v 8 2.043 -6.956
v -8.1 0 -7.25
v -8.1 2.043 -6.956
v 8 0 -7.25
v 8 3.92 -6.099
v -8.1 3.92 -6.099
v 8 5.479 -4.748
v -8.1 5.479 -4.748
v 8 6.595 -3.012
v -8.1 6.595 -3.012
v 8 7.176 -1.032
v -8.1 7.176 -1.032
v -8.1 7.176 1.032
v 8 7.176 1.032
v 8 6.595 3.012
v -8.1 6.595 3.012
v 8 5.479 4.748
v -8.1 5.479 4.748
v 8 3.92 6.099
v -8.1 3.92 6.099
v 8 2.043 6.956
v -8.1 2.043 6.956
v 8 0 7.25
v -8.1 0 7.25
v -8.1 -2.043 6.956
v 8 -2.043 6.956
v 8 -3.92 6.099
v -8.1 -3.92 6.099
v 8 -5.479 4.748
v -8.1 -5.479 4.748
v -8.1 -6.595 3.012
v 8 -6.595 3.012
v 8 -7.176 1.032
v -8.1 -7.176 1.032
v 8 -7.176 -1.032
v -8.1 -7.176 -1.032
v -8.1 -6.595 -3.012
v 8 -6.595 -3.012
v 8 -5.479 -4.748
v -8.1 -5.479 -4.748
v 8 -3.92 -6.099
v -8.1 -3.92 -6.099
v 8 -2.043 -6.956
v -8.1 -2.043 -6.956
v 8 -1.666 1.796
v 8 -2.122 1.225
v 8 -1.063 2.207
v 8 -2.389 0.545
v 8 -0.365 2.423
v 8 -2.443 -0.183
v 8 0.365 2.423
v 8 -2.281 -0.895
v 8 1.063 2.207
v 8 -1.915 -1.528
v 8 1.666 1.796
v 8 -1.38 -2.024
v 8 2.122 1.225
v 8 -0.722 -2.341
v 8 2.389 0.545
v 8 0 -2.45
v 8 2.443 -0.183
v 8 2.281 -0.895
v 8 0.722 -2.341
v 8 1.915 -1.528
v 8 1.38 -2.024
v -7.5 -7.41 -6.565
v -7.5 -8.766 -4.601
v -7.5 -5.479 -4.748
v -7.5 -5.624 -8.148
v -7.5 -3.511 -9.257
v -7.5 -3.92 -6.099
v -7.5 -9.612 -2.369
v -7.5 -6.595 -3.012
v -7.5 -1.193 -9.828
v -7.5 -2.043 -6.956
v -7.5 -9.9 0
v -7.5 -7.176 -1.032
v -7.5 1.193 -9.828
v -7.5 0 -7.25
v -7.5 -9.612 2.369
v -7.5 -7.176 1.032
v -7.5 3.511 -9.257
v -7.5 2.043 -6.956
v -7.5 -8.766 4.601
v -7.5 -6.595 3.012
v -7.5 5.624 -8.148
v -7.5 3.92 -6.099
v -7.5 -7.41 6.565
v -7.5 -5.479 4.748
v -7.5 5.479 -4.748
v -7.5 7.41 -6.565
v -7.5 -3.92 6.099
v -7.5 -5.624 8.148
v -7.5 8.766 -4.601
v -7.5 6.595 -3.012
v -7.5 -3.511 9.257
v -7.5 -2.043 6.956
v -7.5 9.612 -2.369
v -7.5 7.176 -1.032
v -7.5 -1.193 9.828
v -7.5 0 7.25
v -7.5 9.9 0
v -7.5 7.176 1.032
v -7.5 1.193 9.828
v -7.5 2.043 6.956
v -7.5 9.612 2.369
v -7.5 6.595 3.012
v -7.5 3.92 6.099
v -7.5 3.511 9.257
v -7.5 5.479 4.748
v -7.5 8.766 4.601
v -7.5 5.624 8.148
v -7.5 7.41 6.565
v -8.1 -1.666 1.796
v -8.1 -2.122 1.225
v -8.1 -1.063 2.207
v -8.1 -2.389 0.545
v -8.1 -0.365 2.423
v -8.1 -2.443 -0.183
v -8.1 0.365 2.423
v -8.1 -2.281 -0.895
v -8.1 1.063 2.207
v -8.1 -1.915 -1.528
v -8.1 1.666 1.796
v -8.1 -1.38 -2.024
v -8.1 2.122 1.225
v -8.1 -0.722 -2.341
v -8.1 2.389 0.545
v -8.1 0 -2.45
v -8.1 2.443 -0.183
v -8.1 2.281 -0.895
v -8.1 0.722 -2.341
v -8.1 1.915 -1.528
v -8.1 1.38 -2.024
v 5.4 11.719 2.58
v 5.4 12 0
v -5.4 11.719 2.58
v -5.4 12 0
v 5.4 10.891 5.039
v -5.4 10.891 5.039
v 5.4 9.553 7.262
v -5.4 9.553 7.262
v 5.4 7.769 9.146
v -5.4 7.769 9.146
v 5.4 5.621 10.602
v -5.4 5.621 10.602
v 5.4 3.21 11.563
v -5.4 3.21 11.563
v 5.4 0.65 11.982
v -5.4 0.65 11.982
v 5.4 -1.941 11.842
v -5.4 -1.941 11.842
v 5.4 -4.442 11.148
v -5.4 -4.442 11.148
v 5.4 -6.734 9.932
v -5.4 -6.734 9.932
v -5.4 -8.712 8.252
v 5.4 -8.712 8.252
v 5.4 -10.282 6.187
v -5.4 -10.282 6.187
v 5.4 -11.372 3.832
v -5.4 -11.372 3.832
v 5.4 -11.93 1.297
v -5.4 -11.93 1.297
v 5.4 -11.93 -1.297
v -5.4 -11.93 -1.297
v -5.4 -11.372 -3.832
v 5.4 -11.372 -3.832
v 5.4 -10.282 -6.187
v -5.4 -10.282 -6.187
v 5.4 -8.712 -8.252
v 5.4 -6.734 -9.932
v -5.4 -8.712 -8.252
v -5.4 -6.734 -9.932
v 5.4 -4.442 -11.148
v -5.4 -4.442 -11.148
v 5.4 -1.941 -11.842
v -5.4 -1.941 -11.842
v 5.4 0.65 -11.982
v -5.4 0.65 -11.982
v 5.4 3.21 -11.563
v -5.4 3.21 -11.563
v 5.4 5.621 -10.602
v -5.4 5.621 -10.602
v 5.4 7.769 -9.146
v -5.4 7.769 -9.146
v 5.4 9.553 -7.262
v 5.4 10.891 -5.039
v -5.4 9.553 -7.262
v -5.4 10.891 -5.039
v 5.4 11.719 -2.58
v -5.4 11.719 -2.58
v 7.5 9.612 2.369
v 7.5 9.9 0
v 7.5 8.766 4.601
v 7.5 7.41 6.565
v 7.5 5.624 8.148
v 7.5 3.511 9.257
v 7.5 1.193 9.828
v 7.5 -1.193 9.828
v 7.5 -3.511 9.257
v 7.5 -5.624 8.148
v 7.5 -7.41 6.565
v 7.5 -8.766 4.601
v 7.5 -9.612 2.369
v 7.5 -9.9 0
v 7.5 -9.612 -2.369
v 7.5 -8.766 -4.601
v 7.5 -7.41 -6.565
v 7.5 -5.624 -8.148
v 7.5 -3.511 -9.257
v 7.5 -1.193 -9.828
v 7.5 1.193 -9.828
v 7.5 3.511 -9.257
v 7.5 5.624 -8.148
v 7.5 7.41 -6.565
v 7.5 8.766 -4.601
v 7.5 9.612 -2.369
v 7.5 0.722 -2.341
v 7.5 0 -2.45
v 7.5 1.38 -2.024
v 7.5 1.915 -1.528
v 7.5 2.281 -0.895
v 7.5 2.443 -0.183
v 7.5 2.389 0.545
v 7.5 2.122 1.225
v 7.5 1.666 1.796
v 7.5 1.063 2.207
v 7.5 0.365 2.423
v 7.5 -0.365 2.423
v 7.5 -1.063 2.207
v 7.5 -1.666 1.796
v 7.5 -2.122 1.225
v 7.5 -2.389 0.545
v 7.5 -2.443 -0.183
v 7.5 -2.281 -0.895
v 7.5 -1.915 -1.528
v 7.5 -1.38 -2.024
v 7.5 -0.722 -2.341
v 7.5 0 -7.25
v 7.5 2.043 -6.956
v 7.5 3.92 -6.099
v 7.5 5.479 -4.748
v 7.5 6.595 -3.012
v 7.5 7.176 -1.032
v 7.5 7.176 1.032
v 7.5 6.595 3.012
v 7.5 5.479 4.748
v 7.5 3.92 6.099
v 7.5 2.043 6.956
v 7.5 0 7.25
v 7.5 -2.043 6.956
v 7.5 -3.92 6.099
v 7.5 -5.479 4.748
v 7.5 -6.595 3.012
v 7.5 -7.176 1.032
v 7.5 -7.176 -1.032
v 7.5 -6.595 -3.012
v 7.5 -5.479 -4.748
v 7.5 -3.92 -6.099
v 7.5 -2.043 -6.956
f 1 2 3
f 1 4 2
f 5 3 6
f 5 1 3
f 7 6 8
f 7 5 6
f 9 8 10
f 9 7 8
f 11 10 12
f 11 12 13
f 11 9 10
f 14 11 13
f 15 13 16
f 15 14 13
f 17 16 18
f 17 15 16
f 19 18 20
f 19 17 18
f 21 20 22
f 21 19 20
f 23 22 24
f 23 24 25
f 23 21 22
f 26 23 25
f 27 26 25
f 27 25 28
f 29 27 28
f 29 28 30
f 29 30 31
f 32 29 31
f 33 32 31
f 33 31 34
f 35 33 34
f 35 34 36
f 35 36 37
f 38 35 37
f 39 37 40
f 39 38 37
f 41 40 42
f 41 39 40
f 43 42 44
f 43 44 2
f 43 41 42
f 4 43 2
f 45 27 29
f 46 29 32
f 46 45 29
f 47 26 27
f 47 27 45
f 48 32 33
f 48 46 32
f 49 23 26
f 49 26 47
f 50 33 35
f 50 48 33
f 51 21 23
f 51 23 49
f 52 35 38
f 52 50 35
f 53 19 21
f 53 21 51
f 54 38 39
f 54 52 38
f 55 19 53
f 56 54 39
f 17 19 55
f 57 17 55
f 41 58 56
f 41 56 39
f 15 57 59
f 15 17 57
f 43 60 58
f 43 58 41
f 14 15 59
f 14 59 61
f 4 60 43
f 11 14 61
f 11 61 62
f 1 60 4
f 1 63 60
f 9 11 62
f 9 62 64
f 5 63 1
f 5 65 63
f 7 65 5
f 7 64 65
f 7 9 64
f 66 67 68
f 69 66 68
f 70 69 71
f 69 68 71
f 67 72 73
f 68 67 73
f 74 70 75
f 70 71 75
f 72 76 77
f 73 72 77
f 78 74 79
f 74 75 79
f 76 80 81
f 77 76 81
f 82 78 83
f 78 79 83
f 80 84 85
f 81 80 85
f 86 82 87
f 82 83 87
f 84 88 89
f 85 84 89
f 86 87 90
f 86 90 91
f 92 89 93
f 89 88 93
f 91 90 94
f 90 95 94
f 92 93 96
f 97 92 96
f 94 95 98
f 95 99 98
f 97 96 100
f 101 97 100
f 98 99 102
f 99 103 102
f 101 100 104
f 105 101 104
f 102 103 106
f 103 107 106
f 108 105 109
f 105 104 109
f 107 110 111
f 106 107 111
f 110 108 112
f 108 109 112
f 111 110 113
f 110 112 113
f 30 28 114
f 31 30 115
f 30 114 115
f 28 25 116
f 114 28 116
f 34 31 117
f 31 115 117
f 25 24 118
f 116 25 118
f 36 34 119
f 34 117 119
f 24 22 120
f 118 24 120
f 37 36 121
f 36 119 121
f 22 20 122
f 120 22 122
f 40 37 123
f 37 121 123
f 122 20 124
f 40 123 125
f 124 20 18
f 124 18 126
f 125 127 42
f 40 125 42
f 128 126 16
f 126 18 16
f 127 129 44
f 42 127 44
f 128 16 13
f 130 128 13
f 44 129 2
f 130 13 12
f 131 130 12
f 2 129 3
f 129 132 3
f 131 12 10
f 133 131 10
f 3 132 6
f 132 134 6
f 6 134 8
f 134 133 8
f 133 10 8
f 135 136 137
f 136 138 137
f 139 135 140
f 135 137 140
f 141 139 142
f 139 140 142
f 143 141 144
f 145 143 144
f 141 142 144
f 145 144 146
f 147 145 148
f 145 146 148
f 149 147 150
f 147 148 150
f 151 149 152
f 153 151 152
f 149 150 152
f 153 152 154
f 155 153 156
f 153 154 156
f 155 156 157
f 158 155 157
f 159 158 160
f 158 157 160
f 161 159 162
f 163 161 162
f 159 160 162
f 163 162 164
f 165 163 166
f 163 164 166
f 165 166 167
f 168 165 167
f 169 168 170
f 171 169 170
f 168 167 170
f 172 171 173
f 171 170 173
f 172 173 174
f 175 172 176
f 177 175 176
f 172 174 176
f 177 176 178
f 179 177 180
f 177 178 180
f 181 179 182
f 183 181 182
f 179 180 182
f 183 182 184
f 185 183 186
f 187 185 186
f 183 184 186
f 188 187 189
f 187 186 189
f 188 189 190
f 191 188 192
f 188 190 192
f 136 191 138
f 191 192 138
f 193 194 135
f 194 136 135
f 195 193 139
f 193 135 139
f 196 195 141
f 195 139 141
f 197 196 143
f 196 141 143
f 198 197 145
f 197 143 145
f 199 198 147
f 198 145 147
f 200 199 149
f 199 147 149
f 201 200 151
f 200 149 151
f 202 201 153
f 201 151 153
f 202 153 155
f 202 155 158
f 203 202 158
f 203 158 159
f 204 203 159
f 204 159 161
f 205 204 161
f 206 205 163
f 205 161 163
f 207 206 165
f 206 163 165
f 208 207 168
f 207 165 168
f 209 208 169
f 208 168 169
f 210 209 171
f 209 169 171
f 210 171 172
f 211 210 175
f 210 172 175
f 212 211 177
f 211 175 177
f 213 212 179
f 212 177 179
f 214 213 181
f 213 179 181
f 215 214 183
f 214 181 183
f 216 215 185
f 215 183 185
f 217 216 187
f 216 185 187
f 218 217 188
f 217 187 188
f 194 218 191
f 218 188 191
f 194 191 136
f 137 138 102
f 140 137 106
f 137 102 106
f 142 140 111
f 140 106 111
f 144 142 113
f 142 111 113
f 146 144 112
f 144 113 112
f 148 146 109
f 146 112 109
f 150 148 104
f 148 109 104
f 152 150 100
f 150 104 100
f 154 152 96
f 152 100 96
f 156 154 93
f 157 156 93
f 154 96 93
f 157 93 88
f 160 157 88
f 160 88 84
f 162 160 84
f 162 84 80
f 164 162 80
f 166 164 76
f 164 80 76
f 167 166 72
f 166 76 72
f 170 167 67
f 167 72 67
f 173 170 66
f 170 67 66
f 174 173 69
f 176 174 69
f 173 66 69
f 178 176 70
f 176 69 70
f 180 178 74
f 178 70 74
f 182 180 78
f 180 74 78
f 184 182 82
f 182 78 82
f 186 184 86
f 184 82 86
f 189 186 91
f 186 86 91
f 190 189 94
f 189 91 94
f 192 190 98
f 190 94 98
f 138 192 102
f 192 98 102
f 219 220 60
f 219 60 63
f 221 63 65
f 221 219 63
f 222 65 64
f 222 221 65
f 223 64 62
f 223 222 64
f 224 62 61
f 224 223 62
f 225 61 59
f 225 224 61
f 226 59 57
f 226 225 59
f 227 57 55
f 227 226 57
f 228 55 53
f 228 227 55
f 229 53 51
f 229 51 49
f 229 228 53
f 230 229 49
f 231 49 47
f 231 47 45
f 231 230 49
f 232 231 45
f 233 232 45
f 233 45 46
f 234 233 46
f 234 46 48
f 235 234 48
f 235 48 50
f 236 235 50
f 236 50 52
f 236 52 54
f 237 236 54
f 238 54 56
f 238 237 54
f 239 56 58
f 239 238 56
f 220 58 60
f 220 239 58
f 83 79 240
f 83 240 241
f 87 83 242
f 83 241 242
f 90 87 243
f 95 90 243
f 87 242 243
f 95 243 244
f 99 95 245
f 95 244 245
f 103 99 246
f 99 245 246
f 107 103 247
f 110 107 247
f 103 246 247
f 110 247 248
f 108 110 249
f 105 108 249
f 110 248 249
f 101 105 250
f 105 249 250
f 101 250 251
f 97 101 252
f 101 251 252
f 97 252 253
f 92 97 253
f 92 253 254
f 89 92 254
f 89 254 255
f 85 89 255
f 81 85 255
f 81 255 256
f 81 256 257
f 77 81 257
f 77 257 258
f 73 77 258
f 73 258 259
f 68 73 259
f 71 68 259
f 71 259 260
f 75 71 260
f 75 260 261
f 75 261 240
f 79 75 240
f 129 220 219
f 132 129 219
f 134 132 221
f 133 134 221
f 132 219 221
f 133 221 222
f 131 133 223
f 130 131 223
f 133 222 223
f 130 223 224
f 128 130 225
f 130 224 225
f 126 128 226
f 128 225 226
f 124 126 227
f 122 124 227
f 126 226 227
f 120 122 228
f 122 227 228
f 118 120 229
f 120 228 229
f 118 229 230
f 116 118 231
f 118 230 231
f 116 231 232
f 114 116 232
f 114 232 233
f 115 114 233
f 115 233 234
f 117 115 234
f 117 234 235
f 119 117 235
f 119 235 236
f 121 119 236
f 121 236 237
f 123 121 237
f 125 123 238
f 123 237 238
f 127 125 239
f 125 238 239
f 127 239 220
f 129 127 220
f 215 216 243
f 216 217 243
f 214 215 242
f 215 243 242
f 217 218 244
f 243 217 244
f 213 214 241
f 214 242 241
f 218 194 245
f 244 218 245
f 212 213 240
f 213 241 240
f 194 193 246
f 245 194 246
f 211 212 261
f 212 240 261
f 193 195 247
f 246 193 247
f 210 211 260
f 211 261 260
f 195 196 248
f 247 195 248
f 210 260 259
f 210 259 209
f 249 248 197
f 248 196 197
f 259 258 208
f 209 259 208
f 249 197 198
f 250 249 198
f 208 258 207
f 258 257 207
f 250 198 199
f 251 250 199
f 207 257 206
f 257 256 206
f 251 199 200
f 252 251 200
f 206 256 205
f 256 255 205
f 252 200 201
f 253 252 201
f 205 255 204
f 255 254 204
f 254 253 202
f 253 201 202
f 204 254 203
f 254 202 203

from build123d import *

# Parameters (mm, degrees)
CROQUIS2_R                   = 7.25
CROQUIS2_R_2                 = 2.45
SALIENTE_EXTRUIR1_DEPTH      = 0.5
SALIENTE_EXTRUIR1_DEPTH_BACK = 15.6
CROQUIS3_R                   = 7.25
CORTAR_EXTRUIR1_DEPTH        = 14
CORTAR_EXTRUIR1_DEPTH_BACK   = 17.5


with BuildPart() as part:
    # Croquis1 → Revolución1 (revolve)
    with BuildSketch(Plane.XY):
        Polygon((5.4, 12), (-5.4, 12), (-7.5, 9.9), (-7.5, 2.45), (-3, 2.45), (3, 2.45), (7.5, 2.45), (7.5, 9.9), align=None)
    revolve(axis=Axis((0, 0, 0), (1, 0, 0)))

    # Croquis3 → Cortar-Extruir1 (cut, two sides)
    with BuildSketch(Plane(origin=(7.5, 0, 0), x_dir=(0, 0, -1), z_dir=(1, 0, 0))) as cortar_extruir1_sk:
        Circle(CROQUIS3_R)
    extrude(amount=CORTAR_EXTRUIR1_DEPTH, mode=Mode.SUBTRACT)
    extrude(cortar_extruir1_sk.sketch, amount=-CORTAR_EXTRUIR1_DEPTH_BACK, mode=Mode.SUBTRACT)


with BuildPart() as body_2:
    # Croquis2 → Saliente-Extruir1 (new body, two sides)
    with BuildSketch(Plane(origin=(7.5, 0, 0), x_dir=(0, 0, -1), z_dir=(1, 0, 0))) as saliente_extruir1_sk:
        Circle(CROQUIS2_R)
        Circle(CROQUIS2_R_2, mode=Mode.SUBTRACT)
    extrude(amount=SALIENTE_EXTRUIR1_DEPTH)
    extrude(saliente_extruir1_sk.sketch, amount=-SALIENTE_EXTRUIR1_DEPTH_BACK)


solid = Compound([part.part, body_2.part])
